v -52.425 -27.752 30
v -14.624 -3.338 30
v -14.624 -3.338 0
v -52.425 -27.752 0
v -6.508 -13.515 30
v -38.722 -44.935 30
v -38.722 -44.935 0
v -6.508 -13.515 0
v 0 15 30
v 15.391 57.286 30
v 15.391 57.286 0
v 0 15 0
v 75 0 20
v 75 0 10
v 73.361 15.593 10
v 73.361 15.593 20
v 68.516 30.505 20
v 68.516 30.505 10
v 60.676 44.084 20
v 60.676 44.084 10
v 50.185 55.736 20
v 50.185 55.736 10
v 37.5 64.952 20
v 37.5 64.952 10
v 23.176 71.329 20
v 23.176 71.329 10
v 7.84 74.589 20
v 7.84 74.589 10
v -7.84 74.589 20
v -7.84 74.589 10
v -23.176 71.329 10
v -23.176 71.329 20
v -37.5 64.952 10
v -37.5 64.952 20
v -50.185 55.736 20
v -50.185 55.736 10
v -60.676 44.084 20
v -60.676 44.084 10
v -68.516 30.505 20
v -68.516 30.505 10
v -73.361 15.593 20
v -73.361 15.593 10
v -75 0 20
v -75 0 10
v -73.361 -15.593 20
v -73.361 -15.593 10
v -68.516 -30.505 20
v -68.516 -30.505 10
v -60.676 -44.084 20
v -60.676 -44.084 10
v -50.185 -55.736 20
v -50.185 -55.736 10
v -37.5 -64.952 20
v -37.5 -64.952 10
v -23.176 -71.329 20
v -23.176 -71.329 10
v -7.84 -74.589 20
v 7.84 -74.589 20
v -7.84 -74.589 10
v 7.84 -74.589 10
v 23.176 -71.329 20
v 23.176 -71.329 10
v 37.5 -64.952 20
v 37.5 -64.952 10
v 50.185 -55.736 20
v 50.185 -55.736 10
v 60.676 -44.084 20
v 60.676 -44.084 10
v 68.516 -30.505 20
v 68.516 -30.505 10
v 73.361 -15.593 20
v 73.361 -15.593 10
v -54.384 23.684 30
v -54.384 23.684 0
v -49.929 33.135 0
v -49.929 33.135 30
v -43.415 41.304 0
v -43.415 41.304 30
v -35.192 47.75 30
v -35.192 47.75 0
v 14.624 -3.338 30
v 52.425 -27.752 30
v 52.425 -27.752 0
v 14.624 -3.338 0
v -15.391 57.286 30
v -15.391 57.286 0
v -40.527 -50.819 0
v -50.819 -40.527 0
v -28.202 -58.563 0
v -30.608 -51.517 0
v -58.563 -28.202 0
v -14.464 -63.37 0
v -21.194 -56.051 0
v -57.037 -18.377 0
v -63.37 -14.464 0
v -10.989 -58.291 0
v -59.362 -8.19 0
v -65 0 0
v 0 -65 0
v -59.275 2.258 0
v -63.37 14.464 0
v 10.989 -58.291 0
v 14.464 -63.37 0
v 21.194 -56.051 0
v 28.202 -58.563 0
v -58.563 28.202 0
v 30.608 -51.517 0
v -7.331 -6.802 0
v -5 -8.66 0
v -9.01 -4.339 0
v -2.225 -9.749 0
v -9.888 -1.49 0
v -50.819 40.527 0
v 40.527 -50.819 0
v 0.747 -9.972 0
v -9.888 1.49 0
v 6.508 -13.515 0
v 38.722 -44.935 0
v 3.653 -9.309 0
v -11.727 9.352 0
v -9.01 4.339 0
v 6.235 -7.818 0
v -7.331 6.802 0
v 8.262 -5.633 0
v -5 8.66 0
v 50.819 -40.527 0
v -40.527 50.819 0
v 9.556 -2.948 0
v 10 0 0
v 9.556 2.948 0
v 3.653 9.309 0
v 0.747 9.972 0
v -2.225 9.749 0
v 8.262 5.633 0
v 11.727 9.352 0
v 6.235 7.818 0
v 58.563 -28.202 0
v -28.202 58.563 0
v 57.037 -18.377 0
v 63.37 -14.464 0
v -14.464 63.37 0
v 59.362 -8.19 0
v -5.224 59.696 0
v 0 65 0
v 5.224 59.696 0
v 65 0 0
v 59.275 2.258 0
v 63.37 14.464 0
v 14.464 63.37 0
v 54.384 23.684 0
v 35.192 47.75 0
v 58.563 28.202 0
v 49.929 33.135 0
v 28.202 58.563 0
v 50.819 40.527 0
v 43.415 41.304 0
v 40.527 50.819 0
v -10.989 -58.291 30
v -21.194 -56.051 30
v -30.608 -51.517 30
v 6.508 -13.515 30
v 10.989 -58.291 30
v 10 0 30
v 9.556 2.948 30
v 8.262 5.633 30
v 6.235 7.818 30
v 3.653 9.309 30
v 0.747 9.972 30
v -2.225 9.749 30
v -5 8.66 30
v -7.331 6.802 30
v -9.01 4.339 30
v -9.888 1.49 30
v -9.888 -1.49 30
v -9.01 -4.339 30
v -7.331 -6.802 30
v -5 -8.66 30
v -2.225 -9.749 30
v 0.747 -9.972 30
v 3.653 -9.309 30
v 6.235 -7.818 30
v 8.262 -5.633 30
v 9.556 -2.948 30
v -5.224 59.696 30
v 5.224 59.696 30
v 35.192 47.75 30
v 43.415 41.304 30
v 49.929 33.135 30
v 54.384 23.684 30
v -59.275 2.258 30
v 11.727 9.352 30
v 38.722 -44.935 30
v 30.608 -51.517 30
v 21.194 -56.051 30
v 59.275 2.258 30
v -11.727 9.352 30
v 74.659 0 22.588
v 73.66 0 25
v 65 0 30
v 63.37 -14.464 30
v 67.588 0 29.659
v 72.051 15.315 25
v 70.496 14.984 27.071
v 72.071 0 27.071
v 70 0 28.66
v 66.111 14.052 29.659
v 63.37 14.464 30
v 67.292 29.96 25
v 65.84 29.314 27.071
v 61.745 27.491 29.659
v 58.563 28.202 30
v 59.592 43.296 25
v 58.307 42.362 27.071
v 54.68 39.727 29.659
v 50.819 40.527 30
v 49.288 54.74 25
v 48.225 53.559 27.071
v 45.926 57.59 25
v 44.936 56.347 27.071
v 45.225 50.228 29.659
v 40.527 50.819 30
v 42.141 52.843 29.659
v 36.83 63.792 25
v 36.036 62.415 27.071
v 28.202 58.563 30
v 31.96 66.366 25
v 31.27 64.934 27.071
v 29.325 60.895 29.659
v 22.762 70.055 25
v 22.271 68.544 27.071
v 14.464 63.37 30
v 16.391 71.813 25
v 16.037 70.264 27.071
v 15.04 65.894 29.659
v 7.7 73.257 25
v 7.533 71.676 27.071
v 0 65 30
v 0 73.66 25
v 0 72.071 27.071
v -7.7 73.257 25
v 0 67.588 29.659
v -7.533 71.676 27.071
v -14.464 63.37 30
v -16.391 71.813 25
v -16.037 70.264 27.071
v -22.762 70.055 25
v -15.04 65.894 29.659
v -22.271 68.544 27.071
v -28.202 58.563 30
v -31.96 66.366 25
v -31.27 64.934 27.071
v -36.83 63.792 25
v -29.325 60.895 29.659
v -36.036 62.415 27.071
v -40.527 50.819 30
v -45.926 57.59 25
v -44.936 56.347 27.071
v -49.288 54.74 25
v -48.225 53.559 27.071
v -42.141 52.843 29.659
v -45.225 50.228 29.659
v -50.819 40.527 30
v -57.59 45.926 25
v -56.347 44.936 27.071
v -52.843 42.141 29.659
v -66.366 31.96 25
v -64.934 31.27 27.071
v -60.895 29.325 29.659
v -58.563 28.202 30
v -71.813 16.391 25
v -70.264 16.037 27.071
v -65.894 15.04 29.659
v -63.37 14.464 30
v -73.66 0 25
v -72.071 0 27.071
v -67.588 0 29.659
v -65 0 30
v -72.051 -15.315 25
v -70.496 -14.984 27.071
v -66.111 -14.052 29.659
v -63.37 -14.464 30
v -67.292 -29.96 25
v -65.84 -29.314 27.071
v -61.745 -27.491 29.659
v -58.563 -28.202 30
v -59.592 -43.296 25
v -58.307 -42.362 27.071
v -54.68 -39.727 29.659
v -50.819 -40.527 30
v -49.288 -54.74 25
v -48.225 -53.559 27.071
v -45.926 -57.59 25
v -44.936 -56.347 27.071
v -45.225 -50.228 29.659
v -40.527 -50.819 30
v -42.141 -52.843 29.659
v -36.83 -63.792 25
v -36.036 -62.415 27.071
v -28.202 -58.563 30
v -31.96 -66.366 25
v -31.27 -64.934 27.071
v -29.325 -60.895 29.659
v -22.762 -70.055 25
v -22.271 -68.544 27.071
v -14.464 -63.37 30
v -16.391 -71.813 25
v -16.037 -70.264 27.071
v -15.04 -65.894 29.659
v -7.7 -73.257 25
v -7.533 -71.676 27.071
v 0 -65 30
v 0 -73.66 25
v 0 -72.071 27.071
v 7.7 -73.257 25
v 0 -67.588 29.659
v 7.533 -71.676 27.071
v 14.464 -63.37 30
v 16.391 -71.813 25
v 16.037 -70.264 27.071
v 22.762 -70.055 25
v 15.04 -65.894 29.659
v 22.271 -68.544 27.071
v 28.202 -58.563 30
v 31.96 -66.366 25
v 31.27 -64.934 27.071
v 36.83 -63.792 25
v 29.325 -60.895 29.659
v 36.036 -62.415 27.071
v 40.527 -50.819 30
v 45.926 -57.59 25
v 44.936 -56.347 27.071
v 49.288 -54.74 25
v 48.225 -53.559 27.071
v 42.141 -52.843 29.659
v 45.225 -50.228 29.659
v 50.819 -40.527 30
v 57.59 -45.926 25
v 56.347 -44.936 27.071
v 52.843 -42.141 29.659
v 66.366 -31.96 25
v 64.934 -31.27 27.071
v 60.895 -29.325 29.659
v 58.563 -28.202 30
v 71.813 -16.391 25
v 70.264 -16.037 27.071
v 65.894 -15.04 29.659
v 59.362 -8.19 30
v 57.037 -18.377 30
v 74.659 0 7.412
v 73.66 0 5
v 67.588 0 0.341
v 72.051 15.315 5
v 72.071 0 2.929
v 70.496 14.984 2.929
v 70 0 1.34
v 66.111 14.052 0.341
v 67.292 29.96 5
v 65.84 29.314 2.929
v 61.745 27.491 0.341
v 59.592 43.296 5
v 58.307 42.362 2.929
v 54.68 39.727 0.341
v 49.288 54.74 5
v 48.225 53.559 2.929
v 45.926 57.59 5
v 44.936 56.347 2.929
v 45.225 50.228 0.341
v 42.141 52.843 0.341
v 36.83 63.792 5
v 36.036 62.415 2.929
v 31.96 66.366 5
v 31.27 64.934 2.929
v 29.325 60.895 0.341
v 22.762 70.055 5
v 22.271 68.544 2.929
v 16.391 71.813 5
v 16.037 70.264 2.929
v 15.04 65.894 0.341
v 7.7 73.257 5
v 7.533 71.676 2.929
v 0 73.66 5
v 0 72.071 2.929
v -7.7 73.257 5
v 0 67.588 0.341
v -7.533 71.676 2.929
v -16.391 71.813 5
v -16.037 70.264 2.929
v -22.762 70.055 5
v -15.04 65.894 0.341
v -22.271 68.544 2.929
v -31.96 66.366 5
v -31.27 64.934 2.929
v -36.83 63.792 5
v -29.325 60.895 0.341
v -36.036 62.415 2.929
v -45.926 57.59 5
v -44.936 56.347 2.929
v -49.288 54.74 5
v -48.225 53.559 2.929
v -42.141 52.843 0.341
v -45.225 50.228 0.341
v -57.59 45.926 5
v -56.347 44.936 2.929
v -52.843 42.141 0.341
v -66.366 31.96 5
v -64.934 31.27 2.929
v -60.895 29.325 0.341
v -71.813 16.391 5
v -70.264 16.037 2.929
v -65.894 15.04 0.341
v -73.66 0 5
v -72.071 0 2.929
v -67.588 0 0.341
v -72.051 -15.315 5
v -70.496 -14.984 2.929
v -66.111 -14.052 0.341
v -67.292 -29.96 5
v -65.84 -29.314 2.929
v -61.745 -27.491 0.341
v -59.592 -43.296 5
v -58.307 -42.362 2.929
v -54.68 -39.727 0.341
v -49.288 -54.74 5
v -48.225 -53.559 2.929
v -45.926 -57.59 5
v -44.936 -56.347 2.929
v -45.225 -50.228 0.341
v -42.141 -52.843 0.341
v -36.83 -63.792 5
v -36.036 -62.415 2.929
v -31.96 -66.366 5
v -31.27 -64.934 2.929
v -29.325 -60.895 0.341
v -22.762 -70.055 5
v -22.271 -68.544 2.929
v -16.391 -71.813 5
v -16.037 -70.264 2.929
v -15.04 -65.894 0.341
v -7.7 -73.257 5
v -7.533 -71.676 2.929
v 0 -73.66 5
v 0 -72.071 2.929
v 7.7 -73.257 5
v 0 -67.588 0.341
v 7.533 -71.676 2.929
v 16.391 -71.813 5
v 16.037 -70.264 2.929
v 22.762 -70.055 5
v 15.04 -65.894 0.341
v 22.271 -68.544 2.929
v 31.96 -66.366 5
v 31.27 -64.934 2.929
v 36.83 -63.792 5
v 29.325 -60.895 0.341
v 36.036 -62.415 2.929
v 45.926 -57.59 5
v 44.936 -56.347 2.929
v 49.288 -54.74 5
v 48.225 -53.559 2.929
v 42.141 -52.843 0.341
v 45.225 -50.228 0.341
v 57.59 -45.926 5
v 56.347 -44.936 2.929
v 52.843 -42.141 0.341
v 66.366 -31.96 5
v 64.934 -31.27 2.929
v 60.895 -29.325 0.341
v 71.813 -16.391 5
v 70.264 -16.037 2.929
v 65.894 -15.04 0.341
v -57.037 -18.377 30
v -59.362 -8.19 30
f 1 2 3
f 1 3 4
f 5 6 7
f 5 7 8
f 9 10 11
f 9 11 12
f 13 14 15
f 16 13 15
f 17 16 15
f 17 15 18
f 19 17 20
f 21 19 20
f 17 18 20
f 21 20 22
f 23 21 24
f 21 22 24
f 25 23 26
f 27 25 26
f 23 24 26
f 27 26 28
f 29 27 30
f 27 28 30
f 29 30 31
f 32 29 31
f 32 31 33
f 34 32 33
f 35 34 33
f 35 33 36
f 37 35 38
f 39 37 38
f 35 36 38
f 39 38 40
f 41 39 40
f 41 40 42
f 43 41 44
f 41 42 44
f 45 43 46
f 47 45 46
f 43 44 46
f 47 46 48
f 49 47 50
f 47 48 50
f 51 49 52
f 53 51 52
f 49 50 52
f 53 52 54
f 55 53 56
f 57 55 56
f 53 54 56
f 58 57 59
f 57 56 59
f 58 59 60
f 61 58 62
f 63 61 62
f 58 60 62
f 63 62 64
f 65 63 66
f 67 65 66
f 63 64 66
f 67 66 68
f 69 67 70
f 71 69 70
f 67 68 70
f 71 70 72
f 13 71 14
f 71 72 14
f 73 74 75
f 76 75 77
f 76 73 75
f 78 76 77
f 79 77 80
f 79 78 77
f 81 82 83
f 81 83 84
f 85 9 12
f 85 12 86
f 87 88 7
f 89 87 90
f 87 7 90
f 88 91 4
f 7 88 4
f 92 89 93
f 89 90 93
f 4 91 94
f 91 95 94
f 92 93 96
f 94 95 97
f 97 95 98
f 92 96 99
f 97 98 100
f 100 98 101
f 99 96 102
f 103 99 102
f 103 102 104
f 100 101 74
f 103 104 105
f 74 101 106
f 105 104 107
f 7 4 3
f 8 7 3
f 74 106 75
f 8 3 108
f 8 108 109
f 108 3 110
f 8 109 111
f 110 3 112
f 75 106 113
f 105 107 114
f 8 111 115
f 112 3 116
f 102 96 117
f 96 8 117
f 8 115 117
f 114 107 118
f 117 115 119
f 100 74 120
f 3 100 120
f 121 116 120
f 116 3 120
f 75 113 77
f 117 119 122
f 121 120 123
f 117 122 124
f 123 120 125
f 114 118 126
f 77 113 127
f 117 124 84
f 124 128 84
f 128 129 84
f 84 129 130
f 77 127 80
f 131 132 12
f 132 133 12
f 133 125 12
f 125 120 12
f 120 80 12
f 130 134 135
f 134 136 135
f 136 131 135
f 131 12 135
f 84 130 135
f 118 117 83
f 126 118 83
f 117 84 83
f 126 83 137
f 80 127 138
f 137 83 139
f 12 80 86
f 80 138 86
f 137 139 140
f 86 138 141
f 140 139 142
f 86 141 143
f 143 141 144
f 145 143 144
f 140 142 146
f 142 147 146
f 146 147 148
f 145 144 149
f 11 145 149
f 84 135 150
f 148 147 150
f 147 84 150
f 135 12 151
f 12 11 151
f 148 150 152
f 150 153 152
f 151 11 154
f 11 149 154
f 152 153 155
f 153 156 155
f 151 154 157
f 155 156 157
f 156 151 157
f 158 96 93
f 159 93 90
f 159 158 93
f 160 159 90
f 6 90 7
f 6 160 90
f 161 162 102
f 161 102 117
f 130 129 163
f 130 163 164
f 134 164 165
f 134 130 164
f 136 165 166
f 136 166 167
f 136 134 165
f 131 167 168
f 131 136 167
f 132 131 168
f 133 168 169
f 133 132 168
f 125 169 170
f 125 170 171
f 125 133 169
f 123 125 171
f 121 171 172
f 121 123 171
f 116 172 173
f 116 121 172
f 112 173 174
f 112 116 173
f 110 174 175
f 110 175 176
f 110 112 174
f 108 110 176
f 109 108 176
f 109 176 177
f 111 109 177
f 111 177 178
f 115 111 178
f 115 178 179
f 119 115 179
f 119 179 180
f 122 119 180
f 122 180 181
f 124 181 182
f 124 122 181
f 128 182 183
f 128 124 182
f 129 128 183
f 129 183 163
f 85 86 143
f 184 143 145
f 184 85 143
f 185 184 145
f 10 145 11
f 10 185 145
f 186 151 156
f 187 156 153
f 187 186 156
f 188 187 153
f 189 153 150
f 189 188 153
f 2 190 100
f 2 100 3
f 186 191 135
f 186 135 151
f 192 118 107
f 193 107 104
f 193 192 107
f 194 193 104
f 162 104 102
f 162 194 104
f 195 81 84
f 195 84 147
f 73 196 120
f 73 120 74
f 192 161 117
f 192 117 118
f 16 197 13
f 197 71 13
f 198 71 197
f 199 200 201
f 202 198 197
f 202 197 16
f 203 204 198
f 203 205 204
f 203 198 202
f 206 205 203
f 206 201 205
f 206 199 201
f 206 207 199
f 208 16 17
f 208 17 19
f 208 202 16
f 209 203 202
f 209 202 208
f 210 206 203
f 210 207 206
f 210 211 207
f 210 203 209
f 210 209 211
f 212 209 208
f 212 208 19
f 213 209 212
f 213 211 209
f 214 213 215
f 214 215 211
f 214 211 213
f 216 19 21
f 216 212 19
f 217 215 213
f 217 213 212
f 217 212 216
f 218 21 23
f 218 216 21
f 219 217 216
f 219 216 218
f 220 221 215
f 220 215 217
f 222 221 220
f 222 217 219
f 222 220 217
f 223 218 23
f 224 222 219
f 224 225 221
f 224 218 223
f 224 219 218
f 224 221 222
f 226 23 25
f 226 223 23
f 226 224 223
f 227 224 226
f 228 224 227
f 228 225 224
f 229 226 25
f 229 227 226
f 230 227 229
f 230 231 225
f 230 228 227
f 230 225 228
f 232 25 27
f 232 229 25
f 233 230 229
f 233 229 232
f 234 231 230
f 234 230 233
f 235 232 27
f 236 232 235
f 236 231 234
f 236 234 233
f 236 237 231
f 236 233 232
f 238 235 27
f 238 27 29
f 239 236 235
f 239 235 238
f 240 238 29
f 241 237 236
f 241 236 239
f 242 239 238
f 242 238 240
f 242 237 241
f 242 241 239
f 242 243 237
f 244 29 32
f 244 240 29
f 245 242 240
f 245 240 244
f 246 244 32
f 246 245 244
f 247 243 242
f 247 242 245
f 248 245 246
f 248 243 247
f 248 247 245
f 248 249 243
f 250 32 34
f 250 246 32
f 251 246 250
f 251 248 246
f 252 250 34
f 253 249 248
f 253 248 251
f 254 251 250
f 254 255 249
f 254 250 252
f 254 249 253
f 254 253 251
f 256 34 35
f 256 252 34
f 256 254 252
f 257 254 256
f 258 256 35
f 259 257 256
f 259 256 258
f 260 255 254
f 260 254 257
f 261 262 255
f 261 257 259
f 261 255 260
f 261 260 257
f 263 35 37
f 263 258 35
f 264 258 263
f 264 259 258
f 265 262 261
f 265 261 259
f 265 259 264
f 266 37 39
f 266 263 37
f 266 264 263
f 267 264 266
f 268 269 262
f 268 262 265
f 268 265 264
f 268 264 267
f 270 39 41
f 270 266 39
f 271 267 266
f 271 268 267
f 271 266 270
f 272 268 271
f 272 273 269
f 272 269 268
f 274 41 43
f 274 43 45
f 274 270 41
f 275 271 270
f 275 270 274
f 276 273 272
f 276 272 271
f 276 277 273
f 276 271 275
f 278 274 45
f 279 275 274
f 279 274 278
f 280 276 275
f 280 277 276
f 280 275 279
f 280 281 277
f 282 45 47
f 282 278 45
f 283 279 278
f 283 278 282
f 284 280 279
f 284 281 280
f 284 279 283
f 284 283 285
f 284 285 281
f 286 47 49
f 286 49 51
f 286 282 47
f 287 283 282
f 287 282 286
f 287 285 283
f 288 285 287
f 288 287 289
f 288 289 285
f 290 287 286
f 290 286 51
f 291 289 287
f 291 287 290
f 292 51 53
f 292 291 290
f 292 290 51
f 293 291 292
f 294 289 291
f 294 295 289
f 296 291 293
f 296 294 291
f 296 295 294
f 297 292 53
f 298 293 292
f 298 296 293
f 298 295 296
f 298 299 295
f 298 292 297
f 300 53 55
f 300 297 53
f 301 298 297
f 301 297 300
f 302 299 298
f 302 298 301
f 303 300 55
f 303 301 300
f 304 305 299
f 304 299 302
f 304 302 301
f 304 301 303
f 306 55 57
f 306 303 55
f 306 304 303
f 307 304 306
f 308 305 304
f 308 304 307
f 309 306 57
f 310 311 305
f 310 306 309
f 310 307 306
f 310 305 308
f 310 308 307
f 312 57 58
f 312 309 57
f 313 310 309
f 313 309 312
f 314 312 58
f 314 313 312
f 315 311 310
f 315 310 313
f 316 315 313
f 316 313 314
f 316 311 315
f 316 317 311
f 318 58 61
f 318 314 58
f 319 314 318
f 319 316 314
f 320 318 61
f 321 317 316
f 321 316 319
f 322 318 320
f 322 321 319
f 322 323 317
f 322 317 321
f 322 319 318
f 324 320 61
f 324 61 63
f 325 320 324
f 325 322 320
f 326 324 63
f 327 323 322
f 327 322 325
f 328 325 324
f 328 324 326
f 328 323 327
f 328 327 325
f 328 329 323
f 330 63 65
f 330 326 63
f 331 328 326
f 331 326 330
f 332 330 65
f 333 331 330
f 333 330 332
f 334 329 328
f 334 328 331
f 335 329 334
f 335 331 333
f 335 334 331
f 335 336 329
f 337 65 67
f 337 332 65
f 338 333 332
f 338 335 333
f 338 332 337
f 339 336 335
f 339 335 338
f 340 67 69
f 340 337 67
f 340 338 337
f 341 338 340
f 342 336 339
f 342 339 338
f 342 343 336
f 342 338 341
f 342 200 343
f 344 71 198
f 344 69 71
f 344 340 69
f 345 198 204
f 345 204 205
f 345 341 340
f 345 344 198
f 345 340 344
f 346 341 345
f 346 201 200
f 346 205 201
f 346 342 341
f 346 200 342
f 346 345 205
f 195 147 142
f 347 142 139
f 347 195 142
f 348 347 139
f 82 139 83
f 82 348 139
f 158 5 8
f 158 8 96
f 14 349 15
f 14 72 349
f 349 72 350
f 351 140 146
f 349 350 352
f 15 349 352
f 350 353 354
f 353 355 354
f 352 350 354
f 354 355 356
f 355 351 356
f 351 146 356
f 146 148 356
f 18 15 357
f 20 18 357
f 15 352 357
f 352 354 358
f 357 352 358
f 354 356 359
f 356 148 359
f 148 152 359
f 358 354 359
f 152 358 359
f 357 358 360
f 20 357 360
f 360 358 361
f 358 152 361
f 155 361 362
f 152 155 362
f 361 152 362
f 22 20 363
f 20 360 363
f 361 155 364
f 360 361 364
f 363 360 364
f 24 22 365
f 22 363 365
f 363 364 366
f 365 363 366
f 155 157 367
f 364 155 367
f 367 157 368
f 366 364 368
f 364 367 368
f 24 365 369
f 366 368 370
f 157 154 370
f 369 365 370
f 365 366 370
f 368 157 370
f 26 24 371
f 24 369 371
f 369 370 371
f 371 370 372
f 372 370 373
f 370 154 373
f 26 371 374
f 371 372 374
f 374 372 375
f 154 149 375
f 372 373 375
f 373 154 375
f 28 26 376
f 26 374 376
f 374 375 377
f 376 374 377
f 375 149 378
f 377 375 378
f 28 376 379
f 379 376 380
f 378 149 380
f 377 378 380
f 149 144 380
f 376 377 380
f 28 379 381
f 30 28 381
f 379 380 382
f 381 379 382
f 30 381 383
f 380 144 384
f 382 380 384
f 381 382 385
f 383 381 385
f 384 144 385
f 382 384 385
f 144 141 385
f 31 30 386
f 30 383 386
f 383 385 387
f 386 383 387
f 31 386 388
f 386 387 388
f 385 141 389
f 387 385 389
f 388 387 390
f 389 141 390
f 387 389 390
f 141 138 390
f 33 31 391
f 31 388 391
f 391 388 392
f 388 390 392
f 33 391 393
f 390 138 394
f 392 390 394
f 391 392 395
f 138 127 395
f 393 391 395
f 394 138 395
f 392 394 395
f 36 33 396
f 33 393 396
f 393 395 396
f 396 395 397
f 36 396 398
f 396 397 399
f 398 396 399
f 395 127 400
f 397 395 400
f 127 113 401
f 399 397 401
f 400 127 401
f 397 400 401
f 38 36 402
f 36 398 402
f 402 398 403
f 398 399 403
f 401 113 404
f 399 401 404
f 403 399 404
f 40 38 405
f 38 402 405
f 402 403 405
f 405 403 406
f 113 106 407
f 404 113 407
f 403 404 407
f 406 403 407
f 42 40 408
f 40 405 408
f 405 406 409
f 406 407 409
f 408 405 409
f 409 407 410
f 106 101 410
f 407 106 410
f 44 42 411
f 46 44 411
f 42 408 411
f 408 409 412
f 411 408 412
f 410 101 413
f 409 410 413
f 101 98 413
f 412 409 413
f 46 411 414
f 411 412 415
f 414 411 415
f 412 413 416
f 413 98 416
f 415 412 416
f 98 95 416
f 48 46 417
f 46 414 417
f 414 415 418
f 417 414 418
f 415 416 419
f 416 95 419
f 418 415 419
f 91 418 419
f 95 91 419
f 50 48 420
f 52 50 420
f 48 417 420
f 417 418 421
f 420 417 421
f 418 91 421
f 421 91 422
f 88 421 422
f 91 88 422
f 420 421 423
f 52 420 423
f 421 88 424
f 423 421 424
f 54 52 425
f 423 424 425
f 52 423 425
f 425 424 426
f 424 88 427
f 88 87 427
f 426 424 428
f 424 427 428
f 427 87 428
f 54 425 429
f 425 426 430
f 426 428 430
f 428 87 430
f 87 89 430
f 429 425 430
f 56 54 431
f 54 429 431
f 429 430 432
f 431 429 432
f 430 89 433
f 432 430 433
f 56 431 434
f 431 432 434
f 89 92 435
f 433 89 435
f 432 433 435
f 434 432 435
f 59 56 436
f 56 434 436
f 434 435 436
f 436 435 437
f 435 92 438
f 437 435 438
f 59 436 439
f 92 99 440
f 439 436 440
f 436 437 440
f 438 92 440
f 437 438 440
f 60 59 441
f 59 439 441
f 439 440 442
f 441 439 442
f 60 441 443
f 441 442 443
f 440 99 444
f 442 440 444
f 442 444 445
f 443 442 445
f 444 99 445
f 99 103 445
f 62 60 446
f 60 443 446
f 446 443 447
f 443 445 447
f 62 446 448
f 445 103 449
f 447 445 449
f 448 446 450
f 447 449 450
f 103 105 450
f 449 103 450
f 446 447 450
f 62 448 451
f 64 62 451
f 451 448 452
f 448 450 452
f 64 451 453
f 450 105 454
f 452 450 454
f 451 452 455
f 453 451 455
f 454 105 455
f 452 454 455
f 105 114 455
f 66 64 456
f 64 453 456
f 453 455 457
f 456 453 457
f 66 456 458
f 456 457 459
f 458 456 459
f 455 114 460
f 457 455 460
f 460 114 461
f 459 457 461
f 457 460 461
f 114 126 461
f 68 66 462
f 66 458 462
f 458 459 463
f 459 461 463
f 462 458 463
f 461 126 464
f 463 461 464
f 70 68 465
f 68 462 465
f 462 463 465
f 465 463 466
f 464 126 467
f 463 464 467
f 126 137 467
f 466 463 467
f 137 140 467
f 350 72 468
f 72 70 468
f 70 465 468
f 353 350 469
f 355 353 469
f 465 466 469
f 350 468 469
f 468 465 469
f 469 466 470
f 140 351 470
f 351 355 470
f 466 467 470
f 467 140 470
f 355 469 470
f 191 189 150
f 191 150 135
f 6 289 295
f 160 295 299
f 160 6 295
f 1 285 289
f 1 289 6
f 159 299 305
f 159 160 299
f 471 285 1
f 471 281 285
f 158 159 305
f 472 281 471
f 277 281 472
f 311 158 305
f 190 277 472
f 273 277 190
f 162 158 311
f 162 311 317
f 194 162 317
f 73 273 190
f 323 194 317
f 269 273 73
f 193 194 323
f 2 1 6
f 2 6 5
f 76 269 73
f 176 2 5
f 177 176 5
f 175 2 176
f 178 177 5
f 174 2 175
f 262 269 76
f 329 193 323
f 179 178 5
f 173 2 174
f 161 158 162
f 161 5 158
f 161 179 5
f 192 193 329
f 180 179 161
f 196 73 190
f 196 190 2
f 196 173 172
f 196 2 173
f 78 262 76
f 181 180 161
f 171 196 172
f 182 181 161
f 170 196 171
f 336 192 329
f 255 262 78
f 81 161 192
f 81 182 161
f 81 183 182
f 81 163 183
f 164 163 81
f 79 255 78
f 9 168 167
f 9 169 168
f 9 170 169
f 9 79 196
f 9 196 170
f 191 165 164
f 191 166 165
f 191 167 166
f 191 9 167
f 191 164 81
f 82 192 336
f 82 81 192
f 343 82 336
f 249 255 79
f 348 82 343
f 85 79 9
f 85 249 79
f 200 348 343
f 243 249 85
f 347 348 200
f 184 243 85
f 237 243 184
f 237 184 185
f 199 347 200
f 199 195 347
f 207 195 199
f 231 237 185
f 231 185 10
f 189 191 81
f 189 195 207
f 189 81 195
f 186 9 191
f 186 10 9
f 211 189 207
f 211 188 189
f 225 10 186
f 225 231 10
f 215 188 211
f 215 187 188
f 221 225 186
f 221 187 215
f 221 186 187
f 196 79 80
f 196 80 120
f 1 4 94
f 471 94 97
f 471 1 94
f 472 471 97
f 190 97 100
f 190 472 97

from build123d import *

# Parameters (mm, degrees)
SKETCH1_R           = 75
SKETCH1_R_2         = 10
BOSS_EXTRUDE1_DEPTH = 30
CUT_EXTRUDE1_DEPTH  = 111.227038425
FILLET1_R           = 10
CIRPATTERN1_COUNT   = 7


with BuildPart() as part:
    # Sketch1 → Boss-Extrude1 (new body)
    with BuildSketch(Plane.XY):
        Circle(SKETCH1_R)
        Circle(SKETCH1_R_2, mode=Mode.SUBTRACT)
    extrude(amount=BOSS_EXTRUDE1_DEPTH)

    # Sketch2 → Cut-Extrude1 (cut, through all)
    with BuildSketch(Plane.XY.offset(30)):
        with BuildLine():
            Line((0, 15), (-15.39090645, 57.286167935))
            ThreePointArc((-15.39090645, 57.286167935), (0, 60), (15.39090645, 57.286167935))
            Line((15.39090645, 57.286167935), (0, 15))
        make_face()
    cut_extrude1 = extrude(amount=-CUT_EXTRUDE1_DEPTH, mode=Mode.SUBTRACT)

    # Fillet1
    fillet1_edges = [part.edges().sort_by_distance(p)[0] for p in [
        (-75, 0, 0),
        (-75, 0, 30),
    ]]
    fillet(fillet1_edges, radius=FILLET1_R)

    # CirPattern1: Cut-Extrude1 ×7 about axis
    cirpattern1_axis = Axis((0, 0, 0), (0, 0, 1))
    for i in range(1, CIRPATTERN1_COUNT):
        add(cut_extrude1.rotate(cirpattern1_axis, i * 360 / CIRPATTERN1_COUNT), mode=Mode.SUBTRACT)


solid = part.part
